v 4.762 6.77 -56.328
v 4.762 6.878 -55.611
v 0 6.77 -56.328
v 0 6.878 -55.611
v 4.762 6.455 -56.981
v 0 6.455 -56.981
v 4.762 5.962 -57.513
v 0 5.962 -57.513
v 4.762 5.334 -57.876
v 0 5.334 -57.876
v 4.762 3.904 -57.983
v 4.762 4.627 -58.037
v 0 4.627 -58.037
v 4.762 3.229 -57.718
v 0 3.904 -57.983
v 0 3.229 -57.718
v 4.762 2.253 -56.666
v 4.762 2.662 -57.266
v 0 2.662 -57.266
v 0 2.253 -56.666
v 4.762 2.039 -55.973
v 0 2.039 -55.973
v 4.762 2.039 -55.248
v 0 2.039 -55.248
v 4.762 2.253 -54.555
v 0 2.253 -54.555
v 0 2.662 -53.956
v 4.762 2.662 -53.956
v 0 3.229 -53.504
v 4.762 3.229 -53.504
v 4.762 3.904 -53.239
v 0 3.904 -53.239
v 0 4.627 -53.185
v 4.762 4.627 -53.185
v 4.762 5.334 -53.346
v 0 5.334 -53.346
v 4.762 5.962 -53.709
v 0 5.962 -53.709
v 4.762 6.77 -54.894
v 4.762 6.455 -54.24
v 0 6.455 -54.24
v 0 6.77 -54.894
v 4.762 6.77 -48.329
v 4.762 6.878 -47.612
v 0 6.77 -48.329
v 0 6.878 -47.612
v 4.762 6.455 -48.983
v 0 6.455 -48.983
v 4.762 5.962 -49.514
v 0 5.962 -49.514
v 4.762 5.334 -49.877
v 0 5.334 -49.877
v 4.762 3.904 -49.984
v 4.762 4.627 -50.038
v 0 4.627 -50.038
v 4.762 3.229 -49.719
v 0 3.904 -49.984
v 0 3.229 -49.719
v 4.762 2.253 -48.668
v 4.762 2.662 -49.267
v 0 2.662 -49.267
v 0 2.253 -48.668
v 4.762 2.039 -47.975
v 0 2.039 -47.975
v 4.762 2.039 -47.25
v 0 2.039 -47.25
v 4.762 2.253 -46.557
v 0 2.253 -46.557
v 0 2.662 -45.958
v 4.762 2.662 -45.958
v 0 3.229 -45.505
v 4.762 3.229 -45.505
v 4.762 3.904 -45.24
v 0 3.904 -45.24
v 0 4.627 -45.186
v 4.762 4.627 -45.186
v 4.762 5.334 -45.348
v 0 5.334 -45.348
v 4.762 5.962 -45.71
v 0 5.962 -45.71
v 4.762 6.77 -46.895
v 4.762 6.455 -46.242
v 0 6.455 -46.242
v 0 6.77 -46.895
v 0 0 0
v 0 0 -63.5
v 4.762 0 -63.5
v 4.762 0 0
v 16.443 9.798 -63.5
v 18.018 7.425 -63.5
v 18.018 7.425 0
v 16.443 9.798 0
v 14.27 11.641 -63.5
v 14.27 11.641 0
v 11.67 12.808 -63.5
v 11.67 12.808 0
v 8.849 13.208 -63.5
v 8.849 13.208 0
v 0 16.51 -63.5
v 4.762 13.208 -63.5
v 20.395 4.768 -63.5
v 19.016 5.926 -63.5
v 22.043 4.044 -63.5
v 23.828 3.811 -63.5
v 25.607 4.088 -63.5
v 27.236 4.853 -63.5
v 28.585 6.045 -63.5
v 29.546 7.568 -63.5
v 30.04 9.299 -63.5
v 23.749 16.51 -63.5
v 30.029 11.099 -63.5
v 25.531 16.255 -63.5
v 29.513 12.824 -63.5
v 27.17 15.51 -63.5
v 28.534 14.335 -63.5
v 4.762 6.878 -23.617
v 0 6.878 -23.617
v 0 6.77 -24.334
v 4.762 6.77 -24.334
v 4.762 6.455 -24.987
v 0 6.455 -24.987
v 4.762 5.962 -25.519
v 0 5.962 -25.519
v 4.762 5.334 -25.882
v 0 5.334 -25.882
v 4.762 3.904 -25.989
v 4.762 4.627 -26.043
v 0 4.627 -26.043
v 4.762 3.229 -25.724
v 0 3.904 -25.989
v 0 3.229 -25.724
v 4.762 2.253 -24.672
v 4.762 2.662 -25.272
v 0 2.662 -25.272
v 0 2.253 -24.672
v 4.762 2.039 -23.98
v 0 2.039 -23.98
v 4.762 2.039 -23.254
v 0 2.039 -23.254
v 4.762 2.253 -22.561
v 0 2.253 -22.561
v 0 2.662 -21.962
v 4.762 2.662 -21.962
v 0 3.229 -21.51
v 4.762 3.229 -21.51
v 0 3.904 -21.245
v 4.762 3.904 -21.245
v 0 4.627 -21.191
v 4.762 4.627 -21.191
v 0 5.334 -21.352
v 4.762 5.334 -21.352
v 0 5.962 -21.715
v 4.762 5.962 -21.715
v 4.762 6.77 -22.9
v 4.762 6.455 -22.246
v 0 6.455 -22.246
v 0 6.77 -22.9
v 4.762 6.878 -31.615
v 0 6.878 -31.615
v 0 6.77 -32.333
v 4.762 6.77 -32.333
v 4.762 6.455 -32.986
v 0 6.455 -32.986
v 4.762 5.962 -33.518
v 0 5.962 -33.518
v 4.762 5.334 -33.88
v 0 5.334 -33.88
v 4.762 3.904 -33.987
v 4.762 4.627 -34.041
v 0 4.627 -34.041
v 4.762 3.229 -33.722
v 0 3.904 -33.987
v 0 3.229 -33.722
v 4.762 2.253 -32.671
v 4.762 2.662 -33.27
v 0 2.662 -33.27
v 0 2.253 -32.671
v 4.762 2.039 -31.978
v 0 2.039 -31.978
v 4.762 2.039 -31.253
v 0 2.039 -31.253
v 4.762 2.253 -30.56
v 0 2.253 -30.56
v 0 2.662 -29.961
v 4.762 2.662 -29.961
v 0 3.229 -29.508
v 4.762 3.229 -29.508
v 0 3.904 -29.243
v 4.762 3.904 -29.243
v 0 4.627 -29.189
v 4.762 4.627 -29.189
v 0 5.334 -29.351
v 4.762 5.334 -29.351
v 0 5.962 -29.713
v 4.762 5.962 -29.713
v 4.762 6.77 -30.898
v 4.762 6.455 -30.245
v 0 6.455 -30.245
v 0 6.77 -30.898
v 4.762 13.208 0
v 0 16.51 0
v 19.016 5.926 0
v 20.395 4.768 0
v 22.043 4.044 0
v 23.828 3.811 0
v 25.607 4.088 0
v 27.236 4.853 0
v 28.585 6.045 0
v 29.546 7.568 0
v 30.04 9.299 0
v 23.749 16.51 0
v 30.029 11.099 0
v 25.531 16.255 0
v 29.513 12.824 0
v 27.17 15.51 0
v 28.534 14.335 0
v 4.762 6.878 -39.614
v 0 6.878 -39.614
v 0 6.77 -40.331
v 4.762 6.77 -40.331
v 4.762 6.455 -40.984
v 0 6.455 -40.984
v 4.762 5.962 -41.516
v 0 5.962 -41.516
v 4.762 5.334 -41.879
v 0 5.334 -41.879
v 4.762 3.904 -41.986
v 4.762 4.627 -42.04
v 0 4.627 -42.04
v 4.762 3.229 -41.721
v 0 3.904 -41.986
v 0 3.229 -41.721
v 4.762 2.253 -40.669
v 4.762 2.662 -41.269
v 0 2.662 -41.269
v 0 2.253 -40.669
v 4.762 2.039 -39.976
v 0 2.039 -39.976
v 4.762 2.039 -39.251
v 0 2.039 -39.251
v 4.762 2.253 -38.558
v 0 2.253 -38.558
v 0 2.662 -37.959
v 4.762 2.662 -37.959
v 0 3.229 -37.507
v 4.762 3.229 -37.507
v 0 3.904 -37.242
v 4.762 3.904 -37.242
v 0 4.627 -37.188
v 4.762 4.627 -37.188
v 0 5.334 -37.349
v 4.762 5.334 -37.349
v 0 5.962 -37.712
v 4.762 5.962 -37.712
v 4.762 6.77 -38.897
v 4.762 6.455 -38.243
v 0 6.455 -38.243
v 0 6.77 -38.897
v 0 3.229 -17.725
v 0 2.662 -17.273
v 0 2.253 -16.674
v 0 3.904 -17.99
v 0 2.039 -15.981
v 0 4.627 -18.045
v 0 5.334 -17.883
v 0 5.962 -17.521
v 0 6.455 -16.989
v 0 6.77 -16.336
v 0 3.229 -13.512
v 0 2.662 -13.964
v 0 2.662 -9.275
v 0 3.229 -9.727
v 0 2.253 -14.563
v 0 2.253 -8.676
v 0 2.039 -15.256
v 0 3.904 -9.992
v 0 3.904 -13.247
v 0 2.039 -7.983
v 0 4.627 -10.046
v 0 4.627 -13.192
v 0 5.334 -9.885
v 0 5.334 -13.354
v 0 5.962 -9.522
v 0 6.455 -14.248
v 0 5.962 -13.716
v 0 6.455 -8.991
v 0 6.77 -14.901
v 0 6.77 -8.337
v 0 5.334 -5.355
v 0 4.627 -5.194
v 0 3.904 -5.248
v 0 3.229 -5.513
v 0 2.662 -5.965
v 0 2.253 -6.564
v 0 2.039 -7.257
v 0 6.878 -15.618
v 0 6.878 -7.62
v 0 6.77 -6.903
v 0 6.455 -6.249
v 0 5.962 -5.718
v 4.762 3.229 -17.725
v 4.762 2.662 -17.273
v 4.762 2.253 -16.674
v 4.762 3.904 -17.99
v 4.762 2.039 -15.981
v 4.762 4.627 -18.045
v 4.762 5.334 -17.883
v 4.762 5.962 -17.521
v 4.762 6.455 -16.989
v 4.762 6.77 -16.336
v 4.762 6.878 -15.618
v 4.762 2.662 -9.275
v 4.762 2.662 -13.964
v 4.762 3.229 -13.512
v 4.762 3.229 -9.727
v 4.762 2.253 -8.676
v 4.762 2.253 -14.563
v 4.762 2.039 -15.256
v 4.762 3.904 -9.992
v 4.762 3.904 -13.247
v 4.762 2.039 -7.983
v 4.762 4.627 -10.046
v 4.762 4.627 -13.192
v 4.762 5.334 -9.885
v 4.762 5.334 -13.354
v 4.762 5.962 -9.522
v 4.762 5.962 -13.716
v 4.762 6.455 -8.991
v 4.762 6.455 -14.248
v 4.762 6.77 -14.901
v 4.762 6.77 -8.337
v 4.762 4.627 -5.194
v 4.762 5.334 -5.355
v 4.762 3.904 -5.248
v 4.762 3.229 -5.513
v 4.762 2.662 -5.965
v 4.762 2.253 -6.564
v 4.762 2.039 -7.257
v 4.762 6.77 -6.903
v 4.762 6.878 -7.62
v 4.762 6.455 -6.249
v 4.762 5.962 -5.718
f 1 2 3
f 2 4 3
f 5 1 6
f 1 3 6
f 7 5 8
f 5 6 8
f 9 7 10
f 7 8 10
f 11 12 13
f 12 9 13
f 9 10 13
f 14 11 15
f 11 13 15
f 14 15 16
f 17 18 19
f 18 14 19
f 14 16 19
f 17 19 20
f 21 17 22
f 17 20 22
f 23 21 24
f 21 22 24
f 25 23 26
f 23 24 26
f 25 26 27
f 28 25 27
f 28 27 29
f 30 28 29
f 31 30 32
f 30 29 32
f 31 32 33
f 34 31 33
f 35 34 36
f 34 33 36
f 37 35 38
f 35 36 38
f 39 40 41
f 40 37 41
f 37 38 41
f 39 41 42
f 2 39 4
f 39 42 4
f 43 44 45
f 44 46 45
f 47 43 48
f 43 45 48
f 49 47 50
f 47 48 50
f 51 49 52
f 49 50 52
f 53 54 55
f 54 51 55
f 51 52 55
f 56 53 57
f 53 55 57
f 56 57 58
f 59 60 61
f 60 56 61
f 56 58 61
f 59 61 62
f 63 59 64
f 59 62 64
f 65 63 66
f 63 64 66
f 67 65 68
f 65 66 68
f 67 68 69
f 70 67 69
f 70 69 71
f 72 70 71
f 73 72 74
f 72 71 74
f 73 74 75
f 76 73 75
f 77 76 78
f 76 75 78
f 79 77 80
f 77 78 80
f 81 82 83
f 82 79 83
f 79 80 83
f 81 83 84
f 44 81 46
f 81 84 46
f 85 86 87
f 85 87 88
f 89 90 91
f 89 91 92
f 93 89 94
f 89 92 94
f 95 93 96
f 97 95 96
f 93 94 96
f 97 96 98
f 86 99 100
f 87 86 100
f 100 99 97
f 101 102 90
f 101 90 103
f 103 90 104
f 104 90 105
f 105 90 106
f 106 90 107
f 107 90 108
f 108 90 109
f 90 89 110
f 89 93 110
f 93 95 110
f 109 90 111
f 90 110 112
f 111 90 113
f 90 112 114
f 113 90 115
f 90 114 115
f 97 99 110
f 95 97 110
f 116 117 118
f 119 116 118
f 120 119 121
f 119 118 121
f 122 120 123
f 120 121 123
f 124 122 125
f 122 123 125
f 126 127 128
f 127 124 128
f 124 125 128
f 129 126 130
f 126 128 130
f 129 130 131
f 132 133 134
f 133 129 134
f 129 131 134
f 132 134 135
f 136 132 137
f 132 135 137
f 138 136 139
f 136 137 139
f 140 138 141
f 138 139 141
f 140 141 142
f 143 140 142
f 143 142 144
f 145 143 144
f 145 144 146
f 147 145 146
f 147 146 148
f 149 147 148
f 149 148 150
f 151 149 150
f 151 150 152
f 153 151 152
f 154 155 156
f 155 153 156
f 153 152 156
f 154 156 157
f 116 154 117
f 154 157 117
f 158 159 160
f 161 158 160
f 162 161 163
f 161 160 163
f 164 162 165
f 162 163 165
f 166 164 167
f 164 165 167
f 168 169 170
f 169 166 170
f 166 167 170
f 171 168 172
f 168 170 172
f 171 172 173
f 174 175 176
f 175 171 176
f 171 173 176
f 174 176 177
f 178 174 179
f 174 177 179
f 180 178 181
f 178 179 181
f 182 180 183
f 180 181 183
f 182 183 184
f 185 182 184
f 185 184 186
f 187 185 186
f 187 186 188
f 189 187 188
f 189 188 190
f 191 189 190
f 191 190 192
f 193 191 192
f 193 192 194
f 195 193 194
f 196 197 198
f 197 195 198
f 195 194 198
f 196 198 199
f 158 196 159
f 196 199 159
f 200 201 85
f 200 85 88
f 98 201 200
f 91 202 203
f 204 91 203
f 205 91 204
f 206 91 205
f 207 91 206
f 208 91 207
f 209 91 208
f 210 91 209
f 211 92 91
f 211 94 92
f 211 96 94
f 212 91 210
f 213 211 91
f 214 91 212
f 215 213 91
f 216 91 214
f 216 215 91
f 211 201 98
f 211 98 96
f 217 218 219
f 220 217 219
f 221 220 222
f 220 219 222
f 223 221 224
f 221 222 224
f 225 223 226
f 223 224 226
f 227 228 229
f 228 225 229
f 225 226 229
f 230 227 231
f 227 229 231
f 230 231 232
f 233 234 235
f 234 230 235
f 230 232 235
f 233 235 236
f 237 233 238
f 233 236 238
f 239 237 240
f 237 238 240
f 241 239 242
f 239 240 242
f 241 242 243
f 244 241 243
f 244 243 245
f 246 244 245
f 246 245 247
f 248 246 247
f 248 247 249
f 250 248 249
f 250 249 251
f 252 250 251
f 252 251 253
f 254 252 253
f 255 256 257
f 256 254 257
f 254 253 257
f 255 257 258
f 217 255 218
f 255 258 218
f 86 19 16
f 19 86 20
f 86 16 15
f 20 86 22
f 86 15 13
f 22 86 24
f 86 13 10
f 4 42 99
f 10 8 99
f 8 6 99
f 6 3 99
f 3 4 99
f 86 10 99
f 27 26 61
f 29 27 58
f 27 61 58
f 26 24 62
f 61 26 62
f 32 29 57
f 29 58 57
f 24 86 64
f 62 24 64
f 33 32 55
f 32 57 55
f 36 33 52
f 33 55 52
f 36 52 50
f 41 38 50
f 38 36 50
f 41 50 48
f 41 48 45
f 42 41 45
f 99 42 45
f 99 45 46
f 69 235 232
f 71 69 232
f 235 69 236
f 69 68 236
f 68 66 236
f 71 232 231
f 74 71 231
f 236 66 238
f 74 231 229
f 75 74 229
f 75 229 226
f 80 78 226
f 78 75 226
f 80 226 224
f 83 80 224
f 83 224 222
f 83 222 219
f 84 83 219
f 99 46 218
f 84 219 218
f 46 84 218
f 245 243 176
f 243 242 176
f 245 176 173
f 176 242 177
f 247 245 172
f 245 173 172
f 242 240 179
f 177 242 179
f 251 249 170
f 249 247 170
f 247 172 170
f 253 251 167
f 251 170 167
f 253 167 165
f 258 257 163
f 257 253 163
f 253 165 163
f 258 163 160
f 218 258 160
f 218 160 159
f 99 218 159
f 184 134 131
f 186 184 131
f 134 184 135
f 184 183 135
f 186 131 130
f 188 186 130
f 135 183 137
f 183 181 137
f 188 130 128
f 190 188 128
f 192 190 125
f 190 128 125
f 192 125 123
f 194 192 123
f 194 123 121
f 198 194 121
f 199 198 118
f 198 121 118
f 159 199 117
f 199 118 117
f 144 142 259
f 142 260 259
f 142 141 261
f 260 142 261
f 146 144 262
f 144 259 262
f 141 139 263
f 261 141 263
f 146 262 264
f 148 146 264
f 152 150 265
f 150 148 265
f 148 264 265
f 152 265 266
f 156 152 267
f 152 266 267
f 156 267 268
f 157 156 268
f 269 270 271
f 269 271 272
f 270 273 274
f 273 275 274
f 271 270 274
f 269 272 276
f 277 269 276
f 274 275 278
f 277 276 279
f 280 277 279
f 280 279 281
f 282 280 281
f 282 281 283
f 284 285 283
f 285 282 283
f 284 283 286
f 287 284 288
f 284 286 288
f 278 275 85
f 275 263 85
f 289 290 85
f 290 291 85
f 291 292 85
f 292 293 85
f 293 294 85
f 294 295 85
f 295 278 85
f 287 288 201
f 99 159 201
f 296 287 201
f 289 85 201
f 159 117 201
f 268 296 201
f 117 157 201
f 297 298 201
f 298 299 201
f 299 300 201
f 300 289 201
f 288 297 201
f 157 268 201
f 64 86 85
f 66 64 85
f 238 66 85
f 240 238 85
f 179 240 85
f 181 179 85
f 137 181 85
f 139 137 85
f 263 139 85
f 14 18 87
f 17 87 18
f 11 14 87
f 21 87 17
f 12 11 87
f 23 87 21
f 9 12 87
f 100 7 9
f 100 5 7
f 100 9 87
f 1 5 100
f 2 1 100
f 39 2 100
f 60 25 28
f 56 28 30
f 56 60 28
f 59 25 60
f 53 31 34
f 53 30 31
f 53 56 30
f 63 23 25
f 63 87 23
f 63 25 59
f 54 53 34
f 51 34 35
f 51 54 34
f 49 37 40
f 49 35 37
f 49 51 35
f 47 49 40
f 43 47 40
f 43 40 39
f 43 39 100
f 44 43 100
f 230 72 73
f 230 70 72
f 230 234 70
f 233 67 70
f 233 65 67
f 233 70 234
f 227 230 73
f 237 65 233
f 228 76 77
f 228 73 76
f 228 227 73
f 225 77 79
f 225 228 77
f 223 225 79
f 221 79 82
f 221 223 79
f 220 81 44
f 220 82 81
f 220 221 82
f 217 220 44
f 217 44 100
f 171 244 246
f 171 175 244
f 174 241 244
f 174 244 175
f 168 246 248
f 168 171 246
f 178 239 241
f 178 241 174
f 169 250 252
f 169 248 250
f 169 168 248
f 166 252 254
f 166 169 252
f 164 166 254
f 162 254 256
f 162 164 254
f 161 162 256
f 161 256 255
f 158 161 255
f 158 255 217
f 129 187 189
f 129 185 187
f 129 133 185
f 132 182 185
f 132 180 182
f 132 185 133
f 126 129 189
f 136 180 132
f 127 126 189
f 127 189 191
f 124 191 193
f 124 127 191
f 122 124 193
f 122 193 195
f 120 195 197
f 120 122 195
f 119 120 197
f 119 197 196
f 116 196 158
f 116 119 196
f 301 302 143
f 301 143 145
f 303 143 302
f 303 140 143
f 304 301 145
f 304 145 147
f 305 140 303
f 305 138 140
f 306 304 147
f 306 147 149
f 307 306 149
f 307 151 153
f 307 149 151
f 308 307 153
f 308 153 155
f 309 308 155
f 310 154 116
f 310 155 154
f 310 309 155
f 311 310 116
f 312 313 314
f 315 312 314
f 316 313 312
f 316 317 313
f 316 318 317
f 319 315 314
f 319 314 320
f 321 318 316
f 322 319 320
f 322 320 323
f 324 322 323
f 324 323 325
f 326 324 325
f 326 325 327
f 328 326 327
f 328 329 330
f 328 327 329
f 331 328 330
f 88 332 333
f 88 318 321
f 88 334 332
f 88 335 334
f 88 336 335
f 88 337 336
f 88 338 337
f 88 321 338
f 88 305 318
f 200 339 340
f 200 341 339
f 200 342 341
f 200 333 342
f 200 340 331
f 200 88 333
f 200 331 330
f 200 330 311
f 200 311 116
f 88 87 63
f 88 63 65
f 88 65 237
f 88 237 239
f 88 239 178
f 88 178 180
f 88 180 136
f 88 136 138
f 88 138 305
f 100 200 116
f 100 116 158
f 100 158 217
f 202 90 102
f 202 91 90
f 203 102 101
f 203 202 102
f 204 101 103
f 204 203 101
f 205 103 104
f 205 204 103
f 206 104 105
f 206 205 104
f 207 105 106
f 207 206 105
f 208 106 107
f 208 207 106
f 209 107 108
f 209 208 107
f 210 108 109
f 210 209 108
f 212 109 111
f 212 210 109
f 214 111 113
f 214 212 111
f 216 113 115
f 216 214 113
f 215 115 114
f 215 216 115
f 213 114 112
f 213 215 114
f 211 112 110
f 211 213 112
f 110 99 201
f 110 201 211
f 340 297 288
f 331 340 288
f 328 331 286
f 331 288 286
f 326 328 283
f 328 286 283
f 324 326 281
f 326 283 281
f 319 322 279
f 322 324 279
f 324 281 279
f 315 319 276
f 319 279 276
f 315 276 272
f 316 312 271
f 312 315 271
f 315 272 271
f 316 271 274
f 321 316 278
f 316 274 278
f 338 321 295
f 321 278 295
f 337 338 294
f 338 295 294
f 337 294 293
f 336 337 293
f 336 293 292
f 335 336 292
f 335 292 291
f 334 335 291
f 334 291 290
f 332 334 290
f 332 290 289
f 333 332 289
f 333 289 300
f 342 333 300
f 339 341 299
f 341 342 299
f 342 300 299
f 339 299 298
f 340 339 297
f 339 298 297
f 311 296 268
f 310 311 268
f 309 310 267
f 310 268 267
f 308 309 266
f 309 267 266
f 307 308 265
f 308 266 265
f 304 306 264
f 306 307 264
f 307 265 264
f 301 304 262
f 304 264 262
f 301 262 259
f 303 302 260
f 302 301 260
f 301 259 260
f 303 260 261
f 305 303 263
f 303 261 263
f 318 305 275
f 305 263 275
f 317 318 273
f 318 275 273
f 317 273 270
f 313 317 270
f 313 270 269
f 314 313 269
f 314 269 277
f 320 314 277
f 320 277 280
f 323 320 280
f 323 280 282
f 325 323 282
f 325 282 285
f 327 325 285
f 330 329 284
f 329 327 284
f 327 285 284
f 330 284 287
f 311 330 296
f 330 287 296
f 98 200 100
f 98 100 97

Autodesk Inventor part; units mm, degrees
ref_plane "YZ Plane" through (0, 0, 0) normal (1, 0, 0) x (0, 1, 0)
ref_plane "XZ Plane" through (0, 0, 0) normal (0, 1, 0) x (-1, 0, 0)
ref_plane "XY Plane" through (0, 0, 0) normal (0, 0, 1) x (1, 0, 0)
sketch "Sketch1" plane through (0, 0, 0) normal (1, 0, 0) x (0, 1, 0)
  line L0 (0, 0) -> (16.51, 0)
  line L1 (16.51, 0) -> (16.51, -63.5)
  line L2 (16.51, -63.5) -> (0, -63.5)
  line L3 (0, -63.5) -> (0, 0)
  circle A0 centre (4.445, -7.62) radius 2.4329
  circle A1 centre (4.445, -15.6185) radius 2.4329
  circle A2 centre (4.445, -23.6169) radius 2.4329
  circle A3 centre (4.445, -31.6154) radius 2.4329
  circle A4 centre (4.445, -39.6138) radius 2.4329
  circle A5 centre (4.445, -47.6123) radius 2.4329
  circle A6 centre (4.445, -55.6108) radius 2.4329
  dimension "d0" = 63.5
  dimension "d1" = 16.51
  dimension "d6" = 7.9985
  dimension "d11" = 7.62
extrude "Extrusion1" add sketch "Sketch1" along normal blind 4.7625
sketch "Sketch2" plane through (4.7625, 0, 0) normal (1, 0, 0) x (0, 0, -1)
  line L0 (63.5, 16.51) -> (0, 16.51) projected
  line L1 (63.5, 0) -> (63.5, 16.51) projected
  line L2 (0, 16.51) -> (63.5, 16.51)
  line L3 (63.5, 16.51) -> (63.5, 13.208)
  line L4 (63.5, 13.208) -> (0, 13.208)
  line L5 (0, 13.208) -> (0, 16.51)
  point P0 (0, 0)
  dimension "d14" = 3.302
extrude "Extrusion2" add sketch "Sketch2" along normal blind 1.016
sketch "Sketch3" plane through (0, 0, 0) normal (0, 0, 1) x (1, 0, 0)
  line L0 (5.7785, 16.51) -> (5.7785, 13.208) projected
  arc A0 (18.0184, 7.4246) -> (23.749, 16.51) centre (23.749, 10.16) ccw
  line L1 (0, 16.51) -> (0, 0) projected
  line L2 (5.7785, 16.51) -> (23.749, 16.51)
  line L3 (4.7625, 13.208) -> (5.7785, 13.208) projected
  line L4 (5.7785, 13.208) -> (8.8494, 13.208)
  arc A1 (18.0184, 7.4246) -> (8.8494, 13.208) centre (8.8494, 3.048) ccw
  point P0 (18.1783, 13.208)
  point P1 (9.5258, 13.208)
  dimension "d17" = 23.749
  dimension "d18" = 12.7
extrude "Extrusion3" add sketch "Sketch3" against normal blind 63.5
properties part number "knuckle plate original"
